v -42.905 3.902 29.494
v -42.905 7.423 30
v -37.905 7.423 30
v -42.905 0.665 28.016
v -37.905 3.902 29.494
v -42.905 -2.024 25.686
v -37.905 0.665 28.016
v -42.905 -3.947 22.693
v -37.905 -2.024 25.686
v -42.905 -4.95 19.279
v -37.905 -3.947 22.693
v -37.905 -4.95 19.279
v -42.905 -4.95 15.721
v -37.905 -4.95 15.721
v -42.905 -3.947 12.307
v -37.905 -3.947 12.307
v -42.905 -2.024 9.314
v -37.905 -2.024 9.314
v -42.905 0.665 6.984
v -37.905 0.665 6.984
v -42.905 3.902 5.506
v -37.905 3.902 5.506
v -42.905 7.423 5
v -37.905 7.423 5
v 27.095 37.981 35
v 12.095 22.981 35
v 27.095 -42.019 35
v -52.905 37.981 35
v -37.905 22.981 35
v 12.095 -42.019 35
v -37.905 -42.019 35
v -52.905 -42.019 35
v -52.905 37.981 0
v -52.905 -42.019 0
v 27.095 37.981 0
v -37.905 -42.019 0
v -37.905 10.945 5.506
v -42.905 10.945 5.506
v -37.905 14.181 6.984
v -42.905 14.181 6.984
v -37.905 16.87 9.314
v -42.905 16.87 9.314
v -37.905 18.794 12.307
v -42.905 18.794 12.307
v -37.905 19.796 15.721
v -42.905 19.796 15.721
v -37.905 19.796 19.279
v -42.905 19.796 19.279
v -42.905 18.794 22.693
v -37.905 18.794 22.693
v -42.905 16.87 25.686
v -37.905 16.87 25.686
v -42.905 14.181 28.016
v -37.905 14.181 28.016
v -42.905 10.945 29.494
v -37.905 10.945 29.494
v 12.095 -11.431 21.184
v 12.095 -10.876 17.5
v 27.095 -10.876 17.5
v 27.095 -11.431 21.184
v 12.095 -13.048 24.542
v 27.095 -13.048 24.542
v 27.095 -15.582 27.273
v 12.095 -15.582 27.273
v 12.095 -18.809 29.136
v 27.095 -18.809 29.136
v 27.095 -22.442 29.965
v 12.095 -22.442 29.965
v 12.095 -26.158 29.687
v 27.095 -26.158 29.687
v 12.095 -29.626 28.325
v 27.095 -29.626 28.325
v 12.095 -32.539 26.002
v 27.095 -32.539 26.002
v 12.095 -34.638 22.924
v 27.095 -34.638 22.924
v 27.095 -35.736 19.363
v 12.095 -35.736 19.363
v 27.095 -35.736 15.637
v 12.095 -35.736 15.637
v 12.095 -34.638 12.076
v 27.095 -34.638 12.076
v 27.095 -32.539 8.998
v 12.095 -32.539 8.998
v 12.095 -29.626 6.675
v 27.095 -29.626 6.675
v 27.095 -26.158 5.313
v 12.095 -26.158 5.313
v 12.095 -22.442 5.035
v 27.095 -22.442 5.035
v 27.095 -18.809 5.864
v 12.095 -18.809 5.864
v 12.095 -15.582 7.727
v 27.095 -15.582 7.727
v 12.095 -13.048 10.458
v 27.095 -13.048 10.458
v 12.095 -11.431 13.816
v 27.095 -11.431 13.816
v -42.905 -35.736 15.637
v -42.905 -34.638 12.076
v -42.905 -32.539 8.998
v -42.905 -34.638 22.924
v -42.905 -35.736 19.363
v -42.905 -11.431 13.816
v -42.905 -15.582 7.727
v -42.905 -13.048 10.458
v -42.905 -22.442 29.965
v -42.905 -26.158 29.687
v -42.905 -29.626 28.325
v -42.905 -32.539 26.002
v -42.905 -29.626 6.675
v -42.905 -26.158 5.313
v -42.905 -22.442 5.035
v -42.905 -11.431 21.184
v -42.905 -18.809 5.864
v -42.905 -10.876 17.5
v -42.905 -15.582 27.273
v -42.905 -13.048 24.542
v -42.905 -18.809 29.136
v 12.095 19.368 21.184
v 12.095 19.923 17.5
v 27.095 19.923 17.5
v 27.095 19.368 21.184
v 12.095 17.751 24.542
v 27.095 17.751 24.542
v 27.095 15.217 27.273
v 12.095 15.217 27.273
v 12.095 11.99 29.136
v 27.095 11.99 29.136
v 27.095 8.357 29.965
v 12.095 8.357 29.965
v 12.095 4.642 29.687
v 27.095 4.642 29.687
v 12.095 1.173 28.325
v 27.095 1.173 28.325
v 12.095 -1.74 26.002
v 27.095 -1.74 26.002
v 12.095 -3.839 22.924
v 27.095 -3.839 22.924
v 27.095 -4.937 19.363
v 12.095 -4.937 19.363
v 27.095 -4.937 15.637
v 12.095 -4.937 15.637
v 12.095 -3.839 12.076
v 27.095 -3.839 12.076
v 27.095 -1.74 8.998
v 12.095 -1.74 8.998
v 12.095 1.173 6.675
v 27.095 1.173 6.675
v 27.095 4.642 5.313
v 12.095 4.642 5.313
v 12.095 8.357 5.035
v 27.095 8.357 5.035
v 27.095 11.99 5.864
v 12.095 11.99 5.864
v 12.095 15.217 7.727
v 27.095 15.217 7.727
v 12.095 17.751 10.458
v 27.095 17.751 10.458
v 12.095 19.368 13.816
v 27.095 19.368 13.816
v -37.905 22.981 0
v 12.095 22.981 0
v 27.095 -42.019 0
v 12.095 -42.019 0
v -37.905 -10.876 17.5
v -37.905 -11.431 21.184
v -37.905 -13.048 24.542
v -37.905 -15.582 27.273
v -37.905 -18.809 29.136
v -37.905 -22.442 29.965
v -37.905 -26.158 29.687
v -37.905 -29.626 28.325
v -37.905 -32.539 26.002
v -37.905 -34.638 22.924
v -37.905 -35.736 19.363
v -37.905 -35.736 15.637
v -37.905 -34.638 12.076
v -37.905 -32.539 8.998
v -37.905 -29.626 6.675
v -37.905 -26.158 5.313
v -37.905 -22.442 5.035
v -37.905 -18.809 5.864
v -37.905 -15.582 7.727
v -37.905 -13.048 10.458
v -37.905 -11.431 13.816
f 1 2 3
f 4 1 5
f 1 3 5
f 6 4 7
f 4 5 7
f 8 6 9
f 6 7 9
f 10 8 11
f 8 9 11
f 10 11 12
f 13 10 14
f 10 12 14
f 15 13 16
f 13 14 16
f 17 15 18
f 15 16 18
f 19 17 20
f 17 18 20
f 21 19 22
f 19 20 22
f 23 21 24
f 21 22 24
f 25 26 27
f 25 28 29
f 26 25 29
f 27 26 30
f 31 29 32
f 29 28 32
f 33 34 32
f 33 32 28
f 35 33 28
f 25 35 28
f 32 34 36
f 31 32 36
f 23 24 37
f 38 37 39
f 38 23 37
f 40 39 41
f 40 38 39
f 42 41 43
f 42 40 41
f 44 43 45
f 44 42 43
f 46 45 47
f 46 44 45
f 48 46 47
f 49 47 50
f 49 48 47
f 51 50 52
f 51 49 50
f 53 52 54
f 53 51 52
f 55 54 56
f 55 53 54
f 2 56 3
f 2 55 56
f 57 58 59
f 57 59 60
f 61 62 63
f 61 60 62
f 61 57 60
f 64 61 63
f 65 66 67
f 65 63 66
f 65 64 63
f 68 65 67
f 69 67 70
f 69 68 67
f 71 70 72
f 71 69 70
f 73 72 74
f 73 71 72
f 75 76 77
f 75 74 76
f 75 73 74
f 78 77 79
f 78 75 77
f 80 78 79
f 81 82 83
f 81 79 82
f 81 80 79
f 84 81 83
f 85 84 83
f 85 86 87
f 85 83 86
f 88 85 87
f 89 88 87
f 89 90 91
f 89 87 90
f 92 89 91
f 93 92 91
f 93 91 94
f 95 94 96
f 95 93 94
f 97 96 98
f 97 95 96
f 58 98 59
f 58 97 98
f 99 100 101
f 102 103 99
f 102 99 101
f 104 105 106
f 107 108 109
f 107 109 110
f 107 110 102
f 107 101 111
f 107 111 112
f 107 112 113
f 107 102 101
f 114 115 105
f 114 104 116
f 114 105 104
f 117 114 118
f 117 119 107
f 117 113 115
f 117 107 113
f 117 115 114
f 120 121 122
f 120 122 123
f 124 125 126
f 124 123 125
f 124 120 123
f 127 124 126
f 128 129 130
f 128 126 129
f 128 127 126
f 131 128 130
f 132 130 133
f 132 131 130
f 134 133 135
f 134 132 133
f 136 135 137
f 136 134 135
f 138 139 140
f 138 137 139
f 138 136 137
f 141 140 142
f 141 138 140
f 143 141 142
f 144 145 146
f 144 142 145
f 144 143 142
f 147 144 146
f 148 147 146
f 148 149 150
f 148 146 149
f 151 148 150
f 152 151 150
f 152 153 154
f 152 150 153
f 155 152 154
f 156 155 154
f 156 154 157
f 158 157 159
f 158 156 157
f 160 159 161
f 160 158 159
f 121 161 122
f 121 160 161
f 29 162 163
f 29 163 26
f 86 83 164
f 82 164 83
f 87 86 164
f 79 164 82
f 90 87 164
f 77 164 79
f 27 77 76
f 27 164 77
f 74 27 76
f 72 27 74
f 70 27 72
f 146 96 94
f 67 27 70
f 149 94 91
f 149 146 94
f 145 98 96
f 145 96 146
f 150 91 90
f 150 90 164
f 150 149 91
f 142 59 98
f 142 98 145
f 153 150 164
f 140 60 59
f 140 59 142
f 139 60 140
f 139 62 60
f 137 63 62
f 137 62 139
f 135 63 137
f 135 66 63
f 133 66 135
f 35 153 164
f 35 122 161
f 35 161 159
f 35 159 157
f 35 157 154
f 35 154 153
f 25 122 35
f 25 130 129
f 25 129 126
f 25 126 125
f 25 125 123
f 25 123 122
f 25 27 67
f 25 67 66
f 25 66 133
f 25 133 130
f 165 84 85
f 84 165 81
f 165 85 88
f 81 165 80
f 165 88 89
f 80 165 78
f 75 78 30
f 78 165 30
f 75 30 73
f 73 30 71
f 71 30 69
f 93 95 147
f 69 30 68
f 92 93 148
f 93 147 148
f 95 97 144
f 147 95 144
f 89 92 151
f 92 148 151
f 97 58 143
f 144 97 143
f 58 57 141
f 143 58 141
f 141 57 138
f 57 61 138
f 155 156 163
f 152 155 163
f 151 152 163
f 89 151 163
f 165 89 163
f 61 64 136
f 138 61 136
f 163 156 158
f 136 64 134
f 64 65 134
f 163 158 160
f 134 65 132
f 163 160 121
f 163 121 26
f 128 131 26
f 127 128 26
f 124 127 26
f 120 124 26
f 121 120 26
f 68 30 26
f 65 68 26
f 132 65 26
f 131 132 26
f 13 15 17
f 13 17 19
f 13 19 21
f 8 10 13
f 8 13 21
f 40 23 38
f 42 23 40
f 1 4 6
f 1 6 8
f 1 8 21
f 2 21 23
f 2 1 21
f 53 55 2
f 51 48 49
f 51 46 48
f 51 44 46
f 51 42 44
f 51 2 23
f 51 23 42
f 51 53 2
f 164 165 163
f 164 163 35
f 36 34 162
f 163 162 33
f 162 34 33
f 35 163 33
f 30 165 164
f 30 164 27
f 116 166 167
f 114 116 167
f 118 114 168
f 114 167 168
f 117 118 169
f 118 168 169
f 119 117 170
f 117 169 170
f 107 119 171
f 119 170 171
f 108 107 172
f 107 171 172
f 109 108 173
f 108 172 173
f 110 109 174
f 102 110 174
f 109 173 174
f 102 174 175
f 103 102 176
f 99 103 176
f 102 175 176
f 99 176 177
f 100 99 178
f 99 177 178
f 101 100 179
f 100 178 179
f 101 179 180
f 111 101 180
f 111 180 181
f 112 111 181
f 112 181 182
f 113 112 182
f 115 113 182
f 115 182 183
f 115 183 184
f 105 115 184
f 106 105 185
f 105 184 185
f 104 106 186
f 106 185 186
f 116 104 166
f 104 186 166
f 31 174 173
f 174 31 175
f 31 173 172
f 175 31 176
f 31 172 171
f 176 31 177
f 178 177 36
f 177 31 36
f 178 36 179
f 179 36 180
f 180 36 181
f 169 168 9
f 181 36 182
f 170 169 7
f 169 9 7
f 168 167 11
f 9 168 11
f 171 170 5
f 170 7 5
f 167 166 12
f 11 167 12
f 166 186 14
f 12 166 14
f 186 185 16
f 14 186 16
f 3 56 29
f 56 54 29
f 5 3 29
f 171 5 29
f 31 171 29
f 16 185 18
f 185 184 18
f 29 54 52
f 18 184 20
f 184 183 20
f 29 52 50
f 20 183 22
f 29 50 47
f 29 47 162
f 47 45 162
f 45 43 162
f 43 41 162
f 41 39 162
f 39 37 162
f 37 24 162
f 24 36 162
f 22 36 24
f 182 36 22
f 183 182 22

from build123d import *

# Parameters (mm, degrees)
F0_W      = 15
F0_H      = 80
F1_DEPTH  = 35
F2_W      = 15
F2_H      = 35
F3_DEPTH  = 50
F4_R      = 12.5
F5_DEPTH  = 5
F6_W      = 15
F6_H      = 35
F6_W_2    = 65
F7_DEPTH  = 15
F5_FACE_R = 12.5
F8_DEPTH  = 100


with BuildPart() as f1:
    # F0 (on Top) → F1 (new body)
    with BuildSketch(Plane.XY):
        with Locations((-45.405393, -2.018945)):
            Rectangle(F0_W, F0_H)
    extrude(amount=F1_DEPTH)

    # F2 (on face) → F3 (join)
    with BuildSketch(Plane.YZ.offset(-37.905393)):
        with Locations((30.481055, 17.5)):
            Rectangle(F2_W, F2_H)
    extrude(amount=F3_DEPTH)

    # F4 (on face) → F5 (cut)
    with BuildSketch(Plane.YZ.offset(-37.905393)):
        with Locations((-23.376025, 17.5)):
            Circle(F4_R)
        with Locations((7.423157, 17.5)):
            Circle(F4_R)
    extrude(amount=-F5_DEPTH, mode=Mode.SUBTRACT)

    # F6 (on face) → F7 (join)
    with BuildSketch(Plane.YZ.offset(12.094607)):
        with Locations((30.481055, 17.5)):
            Rectangle(F6_W, F6_H)
        with Locations((-9.518945, 17.5)):
            Rectangle(F6_W_2, F6_H)
    extrude(amount=F7_DEPTH)

    # F5_face (on face) → F8 (cut)
    with BuildSketch(Plane(origin=(-42.905393, -23.376025, 17.5), x_dir=(0, 1, 0), z_dir=(1, 0, 0))):
        Circle(F5_FACE_R)
        with Locations((30.799183, 0)):
            Circle(F5_FACE_R)
    extrude(amount=F8_DEPTH, mode=Mode.SUBTRACT)


solid = f1.part
